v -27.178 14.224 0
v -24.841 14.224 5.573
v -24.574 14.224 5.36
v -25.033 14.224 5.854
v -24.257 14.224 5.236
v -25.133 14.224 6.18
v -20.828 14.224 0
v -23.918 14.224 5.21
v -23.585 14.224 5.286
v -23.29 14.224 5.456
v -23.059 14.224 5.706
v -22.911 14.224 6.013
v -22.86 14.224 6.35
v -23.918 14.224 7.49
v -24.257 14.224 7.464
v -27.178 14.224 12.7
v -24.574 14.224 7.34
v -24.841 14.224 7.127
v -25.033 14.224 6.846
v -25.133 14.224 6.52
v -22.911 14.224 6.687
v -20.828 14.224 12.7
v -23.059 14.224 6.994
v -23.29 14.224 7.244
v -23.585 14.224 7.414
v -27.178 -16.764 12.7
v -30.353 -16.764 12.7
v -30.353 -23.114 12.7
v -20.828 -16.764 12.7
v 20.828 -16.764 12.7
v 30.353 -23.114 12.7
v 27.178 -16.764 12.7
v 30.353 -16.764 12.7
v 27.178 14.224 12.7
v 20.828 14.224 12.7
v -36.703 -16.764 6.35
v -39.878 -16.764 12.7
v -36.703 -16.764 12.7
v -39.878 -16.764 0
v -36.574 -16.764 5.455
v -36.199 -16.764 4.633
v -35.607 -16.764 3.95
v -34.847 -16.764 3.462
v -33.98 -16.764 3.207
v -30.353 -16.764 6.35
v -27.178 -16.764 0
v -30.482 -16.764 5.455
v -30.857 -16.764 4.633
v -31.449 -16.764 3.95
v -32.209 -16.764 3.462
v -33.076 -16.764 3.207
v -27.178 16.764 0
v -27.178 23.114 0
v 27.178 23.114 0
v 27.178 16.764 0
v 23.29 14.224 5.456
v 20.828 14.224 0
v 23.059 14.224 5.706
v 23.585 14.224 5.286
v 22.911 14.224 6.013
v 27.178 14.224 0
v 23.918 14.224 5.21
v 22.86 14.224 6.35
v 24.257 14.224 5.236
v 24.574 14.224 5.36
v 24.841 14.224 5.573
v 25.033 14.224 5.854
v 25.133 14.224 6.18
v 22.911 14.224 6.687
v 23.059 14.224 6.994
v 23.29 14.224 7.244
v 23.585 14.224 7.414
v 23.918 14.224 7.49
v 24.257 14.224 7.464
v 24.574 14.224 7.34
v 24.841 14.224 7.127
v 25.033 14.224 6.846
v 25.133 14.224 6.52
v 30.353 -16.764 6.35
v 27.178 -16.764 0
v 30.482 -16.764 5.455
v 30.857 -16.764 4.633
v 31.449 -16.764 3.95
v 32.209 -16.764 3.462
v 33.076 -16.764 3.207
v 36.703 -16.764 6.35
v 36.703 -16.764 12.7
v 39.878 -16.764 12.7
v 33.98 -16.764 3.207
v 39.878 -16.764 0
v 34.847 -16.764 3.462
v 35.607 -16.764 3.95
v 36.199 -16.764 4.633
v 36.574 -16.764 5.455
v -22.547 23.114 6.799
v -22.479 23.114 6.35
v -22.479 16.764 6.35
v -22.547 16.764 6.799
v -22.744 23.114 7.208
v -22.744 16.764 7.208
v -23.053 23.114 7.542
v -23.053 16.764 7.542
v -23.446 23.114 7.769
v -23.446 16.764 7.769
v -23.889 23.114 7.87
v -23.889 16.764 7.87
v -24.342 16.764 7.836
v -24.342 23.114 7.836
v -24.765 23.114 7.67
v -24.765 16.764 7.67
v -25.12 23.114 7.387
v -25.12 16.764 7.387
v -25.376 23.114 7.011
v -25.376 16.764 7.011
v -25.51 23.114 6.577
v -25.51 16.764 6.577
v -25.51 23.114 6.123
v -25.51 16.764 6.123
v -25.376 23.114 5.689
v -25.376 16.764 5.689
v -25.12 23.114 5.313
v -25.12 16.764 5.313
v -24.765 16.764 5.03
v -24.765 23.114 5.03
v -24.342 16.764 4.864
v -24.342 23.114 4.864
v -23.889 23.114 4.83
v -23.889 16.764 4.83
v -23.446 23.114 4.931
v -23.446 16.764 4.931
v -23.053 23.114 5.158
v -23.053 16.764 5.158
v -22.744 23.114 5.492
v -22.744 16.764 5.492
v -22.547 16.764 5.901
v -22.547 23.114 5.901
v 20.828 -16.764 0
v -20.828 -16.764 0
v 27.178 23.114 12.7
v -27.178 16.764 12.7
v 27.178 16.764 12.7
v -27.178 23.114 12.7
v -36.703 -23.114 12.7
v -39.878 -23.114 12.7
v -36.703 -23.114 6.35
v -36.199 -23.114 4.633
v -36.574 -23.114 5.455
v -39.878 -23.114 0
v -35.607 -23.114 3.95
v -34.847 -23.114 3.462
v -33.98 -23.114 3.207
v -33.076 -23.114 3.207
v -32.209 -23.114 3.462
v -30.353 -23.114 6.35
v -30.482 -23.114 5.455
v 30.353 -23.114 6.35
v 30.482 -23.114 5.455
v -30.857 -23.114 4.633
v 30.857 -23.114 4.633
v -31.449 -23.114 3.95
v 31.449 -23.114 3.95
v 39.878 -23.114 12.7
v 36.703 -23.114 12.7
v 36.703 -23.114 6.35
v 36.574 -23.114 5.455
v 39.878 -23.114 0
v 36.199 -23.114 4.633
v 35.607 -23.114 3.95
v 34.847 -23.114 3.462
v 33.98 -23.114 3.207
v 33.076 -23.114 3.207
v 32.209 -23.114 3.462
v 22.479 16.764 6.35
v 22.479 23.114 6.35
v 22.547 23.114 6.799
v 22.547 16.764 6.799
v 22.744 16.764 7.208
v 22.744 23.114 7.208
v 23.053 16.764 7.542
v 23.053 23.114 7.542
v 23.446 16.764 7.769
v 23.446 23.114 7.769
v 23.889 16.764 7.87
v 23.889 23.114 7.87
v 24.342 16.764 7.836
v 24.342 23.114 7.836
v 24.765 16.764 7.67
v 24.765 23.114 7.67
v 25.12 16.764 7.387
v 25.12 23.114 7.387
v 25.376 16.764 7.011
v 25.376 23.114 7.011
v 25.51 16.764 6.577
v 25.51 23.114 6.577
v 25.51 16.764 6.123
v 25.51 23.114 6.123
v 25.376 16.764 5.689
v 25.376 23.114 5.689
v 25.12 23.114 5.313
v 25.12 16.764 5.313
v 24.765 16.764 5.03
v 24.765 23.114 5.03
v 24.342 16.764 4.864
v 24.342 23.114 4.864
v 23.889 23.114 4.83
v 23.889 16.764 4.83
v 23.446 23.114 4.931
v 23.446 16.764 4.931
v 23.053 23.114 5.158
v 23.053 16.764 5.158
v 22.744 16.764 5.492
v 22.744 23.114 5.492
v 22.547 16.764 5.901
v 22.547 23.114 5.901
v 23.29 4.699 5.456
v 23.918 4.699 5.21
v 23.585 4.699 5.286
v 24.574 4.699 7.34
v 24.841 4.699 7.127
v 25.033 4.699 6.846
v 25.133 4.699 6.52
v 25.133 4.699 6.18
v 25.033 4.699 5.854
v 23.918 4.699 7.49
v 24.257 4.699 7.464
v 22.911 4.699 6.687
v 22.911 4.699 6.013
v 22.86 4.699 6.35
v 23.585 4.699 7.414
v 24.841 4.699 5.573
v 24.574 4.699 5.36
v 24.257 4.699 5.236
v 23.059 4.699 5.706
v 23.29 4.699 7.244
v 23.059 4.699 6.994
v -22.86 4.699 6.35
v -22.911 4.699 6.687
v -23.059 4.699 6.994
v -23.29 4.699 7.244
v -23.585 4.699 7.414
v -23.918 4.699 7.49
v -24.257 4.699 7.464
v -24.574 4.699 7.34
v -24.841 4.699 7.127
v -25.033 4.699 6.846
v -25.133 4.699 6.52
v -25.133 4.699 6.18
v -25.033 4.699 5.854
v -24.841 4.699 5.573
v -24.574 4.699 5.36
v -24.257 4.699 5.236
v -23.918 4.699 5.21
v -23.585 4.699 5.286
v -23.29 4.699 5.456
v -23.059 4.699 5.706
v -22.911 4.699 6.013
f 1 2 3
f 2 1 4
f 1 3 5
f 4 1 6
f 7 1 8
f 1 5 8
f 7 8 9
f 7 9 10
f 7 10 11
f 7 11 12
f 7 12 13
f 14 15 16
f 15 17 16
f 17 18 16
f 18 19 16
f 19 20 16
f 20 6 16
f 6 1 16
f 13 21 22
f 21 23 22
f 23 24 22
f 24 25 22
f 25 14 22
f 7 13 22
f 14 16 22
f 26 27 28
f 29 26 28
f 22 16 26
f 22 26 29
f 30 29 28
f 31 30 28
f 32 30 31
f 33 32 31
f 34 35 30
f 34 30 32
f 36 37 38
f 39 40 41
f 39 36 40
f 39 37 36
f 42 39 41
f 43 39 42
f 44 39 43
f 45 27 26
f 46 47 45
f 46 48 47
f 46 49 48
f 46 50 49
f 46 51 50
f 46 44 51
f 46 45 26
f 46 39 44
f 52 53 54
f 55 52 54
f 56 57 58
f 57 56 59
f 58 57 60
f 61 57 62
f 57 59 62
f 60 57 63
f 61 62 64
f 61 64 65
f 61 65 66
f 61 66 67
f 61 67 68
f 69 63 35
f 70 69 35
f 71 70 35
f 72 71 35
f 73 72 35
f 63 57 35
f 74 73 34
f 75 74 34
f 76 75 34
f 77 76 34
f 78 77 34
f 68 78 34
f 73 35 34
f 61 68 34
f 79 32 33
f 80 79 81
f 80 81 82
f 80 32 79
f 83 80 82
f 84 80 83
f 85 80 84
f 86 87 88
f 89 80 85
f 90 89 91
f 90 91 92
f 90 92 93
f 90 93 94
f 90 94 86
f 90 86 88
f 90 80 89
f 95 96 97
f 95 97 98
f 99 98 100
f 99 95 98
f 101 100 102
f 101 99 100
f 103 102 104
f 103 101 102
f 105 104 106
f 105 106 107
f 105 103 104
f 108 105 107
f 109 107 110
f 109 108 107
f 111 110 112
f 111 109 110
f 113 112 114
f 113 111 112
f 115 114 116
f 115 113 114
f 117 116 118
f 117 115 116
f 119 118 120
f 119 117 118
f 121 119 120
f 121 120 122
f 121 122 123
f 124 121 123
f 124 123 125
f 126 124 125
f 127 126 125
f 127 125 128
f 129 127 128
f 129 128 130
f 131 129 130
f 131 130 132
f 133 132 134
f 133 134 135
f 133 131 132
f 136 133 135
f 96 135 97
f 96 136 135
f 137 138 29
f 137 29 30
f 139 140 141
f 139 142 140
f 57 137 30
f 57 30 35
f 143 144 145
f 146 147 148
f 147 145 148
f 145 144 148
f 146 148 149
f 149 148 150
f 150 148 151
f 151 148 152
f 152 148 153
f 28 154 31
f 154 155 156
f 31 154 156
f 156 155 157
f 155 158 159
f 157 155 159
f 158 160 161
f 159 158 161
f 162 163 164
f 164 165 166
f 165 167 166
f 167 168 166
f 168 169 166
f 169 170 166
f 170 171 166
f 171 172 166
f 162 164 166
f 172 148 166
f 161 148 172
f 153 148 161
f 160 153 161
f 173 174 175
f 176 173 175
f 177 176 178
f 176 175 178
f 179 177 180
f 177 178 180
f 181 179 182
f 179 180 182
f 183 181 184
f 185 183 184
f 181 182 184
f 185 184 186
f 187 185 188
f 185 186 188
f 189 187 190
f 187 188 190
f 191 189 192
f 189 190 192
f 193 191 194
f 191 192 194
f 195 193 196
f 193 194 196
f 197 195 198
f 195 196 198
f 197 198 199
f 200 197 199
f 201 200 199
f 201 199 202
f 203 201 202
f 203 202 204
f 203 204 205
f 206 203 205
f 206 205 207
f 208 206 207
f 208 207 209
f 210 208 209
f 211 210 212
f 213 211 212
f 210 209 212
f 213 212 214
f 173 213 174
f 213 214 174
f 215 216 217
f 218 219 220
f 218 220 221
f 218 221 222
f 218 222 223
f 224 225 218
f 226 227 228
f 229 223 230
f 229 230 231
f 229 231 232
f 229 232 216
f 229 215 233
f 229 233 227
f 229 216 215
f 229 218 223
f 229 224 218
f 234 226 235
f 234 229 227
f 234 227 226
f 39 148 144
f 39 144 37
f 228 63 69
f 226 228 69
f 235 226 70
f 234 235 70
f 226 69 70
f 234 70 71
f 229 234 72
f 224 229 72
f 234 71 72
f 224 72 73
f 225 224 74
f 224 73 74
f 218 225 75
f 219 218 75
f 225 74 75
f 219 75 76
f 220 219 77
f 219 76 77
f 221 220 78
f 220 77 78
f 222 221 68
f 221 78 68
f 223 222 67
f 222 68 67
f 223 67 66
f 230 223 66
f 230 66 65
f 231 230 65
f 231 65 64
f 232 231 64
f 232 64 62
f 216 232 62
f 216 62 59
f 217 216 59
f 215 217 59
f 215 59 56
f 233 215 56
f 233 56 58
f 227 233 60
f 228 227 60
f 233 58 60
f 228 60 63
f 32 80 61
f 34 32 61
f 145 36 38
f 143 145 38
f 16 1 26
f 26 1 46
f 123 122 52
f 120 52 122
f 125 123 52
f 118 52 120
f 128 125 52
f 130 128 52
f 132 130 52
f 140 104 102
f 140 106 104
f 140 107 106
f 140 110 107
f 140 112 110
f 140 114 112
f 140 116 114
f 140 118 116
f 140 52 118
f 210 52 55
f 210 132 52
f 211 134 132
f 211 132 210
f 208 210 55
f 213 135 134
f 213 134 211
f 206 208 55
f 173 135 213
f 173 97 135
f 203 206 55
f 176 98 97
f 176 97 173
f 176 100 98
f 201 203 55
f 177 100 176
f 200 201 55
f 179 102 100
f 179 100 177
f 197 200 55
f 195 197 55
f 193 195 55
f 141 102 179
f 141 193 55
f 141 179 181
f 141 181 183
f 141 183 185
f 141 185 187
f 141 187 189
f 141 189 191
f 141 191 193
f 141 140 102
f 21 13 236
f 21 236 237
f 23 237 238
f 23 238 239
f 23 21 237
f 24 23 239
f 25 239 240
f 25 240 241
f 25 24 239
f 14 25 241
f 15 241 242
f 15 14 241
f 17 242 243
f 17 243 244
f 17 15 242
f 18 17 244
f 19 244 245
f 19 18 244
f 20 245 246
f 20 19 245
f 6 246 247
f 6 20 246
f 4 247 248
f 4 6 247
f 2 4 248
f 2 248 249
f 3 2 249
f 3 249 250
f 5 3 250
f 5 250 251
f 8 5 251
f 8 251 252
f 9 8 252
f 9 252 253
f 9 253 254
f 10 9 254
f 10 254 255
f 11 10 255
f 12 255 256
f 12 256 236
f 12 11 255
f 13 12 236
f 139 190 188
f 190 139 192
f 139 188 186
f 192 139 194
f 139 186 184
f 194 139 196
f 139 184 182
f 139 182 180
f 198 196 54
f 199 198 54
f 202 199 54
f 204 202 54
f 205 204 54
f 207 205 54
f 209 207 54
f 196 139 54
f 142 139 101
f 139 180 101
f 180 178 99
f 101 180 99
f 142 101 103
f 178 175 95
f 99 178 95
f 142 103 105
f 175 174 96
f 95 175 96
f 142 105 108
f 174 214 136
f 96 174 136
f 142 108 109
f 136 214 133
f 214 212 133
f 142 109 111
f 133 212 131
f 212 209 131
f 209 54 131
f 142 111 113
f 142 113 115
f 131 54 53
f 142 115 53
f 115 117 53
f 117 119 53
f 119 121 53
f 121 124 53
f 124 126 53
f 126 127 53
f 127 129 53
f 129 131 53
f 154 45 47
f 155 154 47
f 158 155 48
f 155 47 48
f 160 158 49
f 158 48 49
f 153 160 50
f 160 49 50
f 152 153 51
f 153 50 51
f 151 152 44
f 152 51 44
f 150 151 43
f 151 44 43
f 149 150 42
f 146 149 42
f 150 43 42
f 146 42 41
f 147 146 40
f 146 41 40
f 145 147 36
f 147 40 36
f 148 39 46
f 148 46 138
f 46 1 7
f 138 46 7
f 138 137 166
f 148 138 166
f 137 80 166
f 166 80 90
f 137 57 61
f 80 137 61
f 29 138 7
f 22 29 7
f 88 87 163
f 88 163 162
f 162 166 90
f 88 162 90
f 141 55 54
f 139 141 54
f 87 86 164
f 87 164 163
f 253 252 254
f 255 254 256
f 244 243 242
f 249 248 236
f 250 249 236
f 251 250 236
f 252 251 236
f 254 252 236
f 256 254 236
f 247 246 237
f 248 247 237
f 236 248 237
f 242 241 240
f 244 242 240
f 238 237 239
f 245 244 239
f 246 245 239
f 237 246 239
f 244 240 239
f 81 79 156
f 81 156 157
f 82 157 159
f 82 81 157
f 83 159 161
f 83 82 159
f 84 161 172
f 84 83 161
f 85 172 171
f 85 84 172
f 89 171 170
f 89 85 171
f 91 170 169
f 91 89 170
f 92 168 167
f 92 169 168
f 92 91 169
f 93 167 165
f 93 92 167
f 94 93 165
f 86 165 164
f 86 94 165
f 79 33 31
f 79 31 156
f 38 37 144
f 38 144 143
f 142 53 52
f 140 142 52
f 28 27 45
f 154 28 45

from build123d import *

# Parameters (mm, degrees)
F0_W     = 41.656
F0_H     = 33.528
F0_W_2   = 12.7
F0_H_2   = 6.35
F1_DEPTH = 12.7
F3_DEPTH = 6.351
F4_W     = 54.356
F4_H     = 2.54
F5_DEPTH = 12.701
F6_R     = 1.143
F7_DEPTH = 9.525
F8_R     = 1.524
F9_DEPTH = 6.35


# Not quite as in the source:
# - a pattern or mirror of a feature is missing from the dataset's text; its kind, count and spacing are read off the source's solid


with BuildPart() as f1:
    # F0 (on Top) → F1 (new body)
    with BuildSketch(Plane.XY):
        Polygon((27.178, -16.764), (27.178, 23.114), (-27.178, 23.114), (-27.178, -16.764), (-27.178, -23.114), (27.178, -23.114), align=None)
        Rectangle(F0_W, F0_H, mode=Mode.SUBTRACT)
        with Locations((33.528, -19.939)):
            Rectangle(F0_W_2, F0_H_2)
        with Locations((-33.528, -19.939)):
            Rectangle(F0_W_2, F0_H_2)
    extrude(amount=F1_DEPTH)

    # F2 (on face) → F3 (cut, through all)
    with BuildSketch(Plane(origin=(0, -16.764, 0), x_dir=(-1, 0, 0), z_dir=(0, 1, 0))):
        with BuildLine():
            Line((30.353, 12.7), (30.353, 6.35))
            ThreePointArc((30.353, 6.35), (33.528, 3.175), (36.703, 6.35))
            Line((36.703, 6.35), (36.703, 12.7))
            Line((36.703, 12.7), (30.353, 12.7))
        make_face()
    f3 = extrude(amount=-F3_DEPTH, mode=Mode.SUBTRACT)

    # F3_copies: F3 across plane
    add(f3.mirror(Plane(origin=(0, 0, 0), x_dir=(0, 0, 1), z_dir=(1, 0, 0))), mode=Mode.SUBTRACT)

    # F4 (on face) → F5 (cut, through all)
    with BuildSketch(Plane.XY.offset(12.7)):
        with Locations((0, 15.494)):
            Rectangle(F4_W, F4_H)
    extrude(amount=-F5_DEPTH, mode=Mode.SUBTRACT)

    # F6 (on face) → F7 (cut)
    with BuildSketch(Plane(origin=(0, 14.224, 0), x_dir=(-1, 0, 0), z_dir=(0, 1, 0))):
        with Locations((-24.003, 6.35)):
            Circle(F6_R)
    f7 = extrude(amount=-F7_DEPTH, mode=Mode.SUBTRACT)

    # F7_copies: F7 across plane
    add(f7.mirror(Plane(origin=(0, 0, 0), x_dir=(0, 0, -1), z_dir=(-1, 0, 0))), mode=Mode.SUBTRACT)

    # F8 (on face) → F9 (cut, through all)
    with BuildSketch(Plane(origin=(0, 23.114, 0), x_dir=(-1, 0, 0), z_dir=(0, 1, 0))):
        with Locations((-24.003, 6.35)):
            Circle(F8_R)
    f9 = extrude(amount=-F9_DEPTH, mode=Mode.SUBTRACT)

    # F9_copies: F9 across plane
    add(f9.mirror(Plane(origin=(0, 0, 0), x_dir=(0, 0, -1), z_dir=(-1, 0, 0))), mode=Mode.SUBTRACT)


solid = f1.part
